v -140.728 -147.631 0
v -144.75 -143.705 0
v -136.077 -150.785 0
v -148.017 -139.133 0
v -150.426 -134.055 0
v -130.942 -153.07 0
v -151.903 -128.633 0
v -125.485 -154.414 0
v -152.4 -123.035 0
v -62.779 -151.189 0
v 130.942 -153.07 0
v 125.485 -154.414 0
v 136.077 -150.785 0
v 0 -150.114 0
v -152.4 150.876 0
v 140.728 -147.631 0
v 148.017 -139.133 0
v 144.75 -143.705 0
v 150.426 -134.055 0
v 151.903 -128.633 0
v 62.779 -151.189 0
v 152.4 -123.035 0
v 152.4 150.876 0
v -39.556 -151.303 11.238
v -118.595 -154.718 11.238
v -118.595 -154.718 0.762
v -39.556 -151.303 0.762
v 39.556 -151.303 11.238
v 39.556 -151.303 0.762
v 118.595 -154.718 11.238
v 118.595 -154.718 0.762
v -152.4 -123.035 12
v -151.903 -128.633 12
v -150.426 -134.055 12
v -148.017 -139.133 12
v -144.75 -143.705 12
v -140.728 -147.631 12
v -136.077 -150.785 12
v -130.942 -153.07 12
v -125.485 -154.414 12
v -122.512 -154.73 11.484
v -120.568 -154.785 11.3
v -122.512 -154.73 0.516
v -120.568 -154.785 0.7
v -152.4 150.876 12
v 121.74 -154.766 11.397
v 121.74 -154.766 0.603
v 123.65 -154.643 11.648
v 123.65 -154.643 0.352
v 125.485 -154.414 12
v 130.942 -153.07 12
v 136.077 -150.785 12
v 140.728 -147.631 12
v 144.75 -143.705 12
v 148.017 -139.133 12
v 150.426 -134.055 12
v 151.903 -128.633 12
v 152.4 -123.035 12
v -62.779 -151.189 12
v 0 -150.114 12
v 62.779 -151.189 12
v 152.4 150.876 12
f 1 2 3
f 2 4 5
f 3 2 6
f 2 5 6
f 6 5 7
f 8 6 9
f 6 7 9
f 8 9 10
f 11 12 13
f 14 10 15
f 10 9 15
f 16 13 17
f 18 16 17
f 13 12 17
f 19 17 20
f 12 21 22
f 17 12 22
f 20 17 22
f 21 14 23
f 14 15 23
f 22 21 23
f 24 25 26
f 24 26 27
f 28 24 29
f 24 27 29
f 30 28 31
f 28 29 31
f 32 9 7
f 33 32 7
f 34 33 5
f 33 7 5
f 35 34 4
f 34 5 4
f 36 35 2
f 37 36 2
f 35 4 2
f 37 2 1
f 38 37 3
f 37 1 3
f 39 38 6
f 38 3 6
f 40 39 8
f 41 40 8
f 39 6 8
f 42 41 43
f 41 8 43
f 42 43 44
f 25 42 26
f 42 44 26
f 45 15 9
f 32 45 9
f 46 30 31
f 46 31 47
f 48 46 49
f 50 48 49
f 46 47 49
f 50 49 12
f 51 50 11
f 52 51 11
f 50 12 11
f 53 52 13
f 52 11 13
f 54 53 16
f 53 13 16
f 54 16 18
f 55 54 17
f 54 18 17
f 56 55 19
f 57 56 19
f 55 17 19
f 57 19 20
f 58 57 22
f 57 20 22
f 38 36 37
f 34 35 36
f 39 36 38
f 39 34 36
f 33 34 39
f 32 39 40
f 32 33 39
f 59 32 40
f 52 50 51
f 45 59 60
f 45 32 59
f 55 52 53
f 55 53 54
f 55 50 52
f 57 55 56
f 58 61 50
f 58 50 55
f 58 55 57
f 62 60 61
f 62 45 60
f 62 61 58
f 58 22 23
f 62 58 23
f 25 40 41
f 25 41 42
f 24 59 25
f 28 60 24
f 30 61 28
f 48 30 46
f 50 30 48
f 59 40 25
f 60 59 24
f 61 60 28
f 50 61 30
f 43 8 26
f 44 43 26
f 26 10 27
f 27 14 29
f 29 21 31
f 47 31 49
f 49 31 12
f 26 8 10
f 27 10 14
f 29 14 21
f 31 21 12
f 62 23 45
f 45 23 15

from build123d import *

# Parameters (mm, degrees)
F1_DEPTH    = 12
F2_T2_ANGLE = 8.0362657393
F2_T4_ANGLE = 8.0362657393


# Not quite as in the source:
# - a fillet or chamfer that OpenCascade refuses, or shapes differently, is made with other operations: its cross-section is extruded or revolved along the edge and cut away or added


with BuildPart() as f1:
    # F0 (on Top) → F1 (new body)
    with BuildSketch(Plane.XY):
        with BuildLine():
            Line((152.4, 150.8755259808), (-152.4, 150.8755259808))
            Line((-152.4, 150.8755259808), (-152.4, -123.0348219055))
            ThreePointArc((-152.4, -123.0348219055), (-142.3618011799, -146.2007492455), (-118.5946337308, -154.7182240192))
            ThreePointArc((-118.5946337308, -154.7182240192), (0, -150.8755259808), (118.5946337308, -154.7182240192))
            ThreePointArc((118.5946337308, -154.7182240192), (142.3618011799, -146.2007492455), (152.4, -123.0348219055))
            Line((152.4, -123.0348219055), (152.4, 150.8755259808))
        make_face()
    extrude(amount=F1_DEPTH)

    # F2: chamfer of 0.762 on 2 edges, made by hand

    # F2_s1 → F2_t2 (revolve, cut)
    with BuildSketch(Plane(origin=(-138.6011225893, -9.7360143416, 0), x_dir=(0, 0, 1), z_dir=(-0.9975419239, -0.0700721776, 0))):
        Polygon((11.238, -146.0015284816), (12, -145.2395284816), (12, -146.0015284816), align=None)
    revolve(axis=Axis((0, -1982.8505259812, 12), (0, 0, -1)), revolution_arc=F2_T2_ANGLE, mode=Mode.SUBTRACT)

    # F2_s3 → F2_t4 (revolve, cut)
    with BuildSketch(Plane(origin=(-138.6011225893, -9.7360143416, 0), x_dir=(0, 0, 1), z_dir=(-0.9975419239, -0.0700721776, 0))):
        Polygon((0.762, -146.0015284816), (0, -145.2395284816), (0, -146.0015284816), align=None)
    revolve(axis=Axis((0, -1982.8505259812, 0), (0, 0, -1)), revolution_arc=F2_T4_ANGLE, mode=Mode.SUBTRACT)


solid = f1.part
